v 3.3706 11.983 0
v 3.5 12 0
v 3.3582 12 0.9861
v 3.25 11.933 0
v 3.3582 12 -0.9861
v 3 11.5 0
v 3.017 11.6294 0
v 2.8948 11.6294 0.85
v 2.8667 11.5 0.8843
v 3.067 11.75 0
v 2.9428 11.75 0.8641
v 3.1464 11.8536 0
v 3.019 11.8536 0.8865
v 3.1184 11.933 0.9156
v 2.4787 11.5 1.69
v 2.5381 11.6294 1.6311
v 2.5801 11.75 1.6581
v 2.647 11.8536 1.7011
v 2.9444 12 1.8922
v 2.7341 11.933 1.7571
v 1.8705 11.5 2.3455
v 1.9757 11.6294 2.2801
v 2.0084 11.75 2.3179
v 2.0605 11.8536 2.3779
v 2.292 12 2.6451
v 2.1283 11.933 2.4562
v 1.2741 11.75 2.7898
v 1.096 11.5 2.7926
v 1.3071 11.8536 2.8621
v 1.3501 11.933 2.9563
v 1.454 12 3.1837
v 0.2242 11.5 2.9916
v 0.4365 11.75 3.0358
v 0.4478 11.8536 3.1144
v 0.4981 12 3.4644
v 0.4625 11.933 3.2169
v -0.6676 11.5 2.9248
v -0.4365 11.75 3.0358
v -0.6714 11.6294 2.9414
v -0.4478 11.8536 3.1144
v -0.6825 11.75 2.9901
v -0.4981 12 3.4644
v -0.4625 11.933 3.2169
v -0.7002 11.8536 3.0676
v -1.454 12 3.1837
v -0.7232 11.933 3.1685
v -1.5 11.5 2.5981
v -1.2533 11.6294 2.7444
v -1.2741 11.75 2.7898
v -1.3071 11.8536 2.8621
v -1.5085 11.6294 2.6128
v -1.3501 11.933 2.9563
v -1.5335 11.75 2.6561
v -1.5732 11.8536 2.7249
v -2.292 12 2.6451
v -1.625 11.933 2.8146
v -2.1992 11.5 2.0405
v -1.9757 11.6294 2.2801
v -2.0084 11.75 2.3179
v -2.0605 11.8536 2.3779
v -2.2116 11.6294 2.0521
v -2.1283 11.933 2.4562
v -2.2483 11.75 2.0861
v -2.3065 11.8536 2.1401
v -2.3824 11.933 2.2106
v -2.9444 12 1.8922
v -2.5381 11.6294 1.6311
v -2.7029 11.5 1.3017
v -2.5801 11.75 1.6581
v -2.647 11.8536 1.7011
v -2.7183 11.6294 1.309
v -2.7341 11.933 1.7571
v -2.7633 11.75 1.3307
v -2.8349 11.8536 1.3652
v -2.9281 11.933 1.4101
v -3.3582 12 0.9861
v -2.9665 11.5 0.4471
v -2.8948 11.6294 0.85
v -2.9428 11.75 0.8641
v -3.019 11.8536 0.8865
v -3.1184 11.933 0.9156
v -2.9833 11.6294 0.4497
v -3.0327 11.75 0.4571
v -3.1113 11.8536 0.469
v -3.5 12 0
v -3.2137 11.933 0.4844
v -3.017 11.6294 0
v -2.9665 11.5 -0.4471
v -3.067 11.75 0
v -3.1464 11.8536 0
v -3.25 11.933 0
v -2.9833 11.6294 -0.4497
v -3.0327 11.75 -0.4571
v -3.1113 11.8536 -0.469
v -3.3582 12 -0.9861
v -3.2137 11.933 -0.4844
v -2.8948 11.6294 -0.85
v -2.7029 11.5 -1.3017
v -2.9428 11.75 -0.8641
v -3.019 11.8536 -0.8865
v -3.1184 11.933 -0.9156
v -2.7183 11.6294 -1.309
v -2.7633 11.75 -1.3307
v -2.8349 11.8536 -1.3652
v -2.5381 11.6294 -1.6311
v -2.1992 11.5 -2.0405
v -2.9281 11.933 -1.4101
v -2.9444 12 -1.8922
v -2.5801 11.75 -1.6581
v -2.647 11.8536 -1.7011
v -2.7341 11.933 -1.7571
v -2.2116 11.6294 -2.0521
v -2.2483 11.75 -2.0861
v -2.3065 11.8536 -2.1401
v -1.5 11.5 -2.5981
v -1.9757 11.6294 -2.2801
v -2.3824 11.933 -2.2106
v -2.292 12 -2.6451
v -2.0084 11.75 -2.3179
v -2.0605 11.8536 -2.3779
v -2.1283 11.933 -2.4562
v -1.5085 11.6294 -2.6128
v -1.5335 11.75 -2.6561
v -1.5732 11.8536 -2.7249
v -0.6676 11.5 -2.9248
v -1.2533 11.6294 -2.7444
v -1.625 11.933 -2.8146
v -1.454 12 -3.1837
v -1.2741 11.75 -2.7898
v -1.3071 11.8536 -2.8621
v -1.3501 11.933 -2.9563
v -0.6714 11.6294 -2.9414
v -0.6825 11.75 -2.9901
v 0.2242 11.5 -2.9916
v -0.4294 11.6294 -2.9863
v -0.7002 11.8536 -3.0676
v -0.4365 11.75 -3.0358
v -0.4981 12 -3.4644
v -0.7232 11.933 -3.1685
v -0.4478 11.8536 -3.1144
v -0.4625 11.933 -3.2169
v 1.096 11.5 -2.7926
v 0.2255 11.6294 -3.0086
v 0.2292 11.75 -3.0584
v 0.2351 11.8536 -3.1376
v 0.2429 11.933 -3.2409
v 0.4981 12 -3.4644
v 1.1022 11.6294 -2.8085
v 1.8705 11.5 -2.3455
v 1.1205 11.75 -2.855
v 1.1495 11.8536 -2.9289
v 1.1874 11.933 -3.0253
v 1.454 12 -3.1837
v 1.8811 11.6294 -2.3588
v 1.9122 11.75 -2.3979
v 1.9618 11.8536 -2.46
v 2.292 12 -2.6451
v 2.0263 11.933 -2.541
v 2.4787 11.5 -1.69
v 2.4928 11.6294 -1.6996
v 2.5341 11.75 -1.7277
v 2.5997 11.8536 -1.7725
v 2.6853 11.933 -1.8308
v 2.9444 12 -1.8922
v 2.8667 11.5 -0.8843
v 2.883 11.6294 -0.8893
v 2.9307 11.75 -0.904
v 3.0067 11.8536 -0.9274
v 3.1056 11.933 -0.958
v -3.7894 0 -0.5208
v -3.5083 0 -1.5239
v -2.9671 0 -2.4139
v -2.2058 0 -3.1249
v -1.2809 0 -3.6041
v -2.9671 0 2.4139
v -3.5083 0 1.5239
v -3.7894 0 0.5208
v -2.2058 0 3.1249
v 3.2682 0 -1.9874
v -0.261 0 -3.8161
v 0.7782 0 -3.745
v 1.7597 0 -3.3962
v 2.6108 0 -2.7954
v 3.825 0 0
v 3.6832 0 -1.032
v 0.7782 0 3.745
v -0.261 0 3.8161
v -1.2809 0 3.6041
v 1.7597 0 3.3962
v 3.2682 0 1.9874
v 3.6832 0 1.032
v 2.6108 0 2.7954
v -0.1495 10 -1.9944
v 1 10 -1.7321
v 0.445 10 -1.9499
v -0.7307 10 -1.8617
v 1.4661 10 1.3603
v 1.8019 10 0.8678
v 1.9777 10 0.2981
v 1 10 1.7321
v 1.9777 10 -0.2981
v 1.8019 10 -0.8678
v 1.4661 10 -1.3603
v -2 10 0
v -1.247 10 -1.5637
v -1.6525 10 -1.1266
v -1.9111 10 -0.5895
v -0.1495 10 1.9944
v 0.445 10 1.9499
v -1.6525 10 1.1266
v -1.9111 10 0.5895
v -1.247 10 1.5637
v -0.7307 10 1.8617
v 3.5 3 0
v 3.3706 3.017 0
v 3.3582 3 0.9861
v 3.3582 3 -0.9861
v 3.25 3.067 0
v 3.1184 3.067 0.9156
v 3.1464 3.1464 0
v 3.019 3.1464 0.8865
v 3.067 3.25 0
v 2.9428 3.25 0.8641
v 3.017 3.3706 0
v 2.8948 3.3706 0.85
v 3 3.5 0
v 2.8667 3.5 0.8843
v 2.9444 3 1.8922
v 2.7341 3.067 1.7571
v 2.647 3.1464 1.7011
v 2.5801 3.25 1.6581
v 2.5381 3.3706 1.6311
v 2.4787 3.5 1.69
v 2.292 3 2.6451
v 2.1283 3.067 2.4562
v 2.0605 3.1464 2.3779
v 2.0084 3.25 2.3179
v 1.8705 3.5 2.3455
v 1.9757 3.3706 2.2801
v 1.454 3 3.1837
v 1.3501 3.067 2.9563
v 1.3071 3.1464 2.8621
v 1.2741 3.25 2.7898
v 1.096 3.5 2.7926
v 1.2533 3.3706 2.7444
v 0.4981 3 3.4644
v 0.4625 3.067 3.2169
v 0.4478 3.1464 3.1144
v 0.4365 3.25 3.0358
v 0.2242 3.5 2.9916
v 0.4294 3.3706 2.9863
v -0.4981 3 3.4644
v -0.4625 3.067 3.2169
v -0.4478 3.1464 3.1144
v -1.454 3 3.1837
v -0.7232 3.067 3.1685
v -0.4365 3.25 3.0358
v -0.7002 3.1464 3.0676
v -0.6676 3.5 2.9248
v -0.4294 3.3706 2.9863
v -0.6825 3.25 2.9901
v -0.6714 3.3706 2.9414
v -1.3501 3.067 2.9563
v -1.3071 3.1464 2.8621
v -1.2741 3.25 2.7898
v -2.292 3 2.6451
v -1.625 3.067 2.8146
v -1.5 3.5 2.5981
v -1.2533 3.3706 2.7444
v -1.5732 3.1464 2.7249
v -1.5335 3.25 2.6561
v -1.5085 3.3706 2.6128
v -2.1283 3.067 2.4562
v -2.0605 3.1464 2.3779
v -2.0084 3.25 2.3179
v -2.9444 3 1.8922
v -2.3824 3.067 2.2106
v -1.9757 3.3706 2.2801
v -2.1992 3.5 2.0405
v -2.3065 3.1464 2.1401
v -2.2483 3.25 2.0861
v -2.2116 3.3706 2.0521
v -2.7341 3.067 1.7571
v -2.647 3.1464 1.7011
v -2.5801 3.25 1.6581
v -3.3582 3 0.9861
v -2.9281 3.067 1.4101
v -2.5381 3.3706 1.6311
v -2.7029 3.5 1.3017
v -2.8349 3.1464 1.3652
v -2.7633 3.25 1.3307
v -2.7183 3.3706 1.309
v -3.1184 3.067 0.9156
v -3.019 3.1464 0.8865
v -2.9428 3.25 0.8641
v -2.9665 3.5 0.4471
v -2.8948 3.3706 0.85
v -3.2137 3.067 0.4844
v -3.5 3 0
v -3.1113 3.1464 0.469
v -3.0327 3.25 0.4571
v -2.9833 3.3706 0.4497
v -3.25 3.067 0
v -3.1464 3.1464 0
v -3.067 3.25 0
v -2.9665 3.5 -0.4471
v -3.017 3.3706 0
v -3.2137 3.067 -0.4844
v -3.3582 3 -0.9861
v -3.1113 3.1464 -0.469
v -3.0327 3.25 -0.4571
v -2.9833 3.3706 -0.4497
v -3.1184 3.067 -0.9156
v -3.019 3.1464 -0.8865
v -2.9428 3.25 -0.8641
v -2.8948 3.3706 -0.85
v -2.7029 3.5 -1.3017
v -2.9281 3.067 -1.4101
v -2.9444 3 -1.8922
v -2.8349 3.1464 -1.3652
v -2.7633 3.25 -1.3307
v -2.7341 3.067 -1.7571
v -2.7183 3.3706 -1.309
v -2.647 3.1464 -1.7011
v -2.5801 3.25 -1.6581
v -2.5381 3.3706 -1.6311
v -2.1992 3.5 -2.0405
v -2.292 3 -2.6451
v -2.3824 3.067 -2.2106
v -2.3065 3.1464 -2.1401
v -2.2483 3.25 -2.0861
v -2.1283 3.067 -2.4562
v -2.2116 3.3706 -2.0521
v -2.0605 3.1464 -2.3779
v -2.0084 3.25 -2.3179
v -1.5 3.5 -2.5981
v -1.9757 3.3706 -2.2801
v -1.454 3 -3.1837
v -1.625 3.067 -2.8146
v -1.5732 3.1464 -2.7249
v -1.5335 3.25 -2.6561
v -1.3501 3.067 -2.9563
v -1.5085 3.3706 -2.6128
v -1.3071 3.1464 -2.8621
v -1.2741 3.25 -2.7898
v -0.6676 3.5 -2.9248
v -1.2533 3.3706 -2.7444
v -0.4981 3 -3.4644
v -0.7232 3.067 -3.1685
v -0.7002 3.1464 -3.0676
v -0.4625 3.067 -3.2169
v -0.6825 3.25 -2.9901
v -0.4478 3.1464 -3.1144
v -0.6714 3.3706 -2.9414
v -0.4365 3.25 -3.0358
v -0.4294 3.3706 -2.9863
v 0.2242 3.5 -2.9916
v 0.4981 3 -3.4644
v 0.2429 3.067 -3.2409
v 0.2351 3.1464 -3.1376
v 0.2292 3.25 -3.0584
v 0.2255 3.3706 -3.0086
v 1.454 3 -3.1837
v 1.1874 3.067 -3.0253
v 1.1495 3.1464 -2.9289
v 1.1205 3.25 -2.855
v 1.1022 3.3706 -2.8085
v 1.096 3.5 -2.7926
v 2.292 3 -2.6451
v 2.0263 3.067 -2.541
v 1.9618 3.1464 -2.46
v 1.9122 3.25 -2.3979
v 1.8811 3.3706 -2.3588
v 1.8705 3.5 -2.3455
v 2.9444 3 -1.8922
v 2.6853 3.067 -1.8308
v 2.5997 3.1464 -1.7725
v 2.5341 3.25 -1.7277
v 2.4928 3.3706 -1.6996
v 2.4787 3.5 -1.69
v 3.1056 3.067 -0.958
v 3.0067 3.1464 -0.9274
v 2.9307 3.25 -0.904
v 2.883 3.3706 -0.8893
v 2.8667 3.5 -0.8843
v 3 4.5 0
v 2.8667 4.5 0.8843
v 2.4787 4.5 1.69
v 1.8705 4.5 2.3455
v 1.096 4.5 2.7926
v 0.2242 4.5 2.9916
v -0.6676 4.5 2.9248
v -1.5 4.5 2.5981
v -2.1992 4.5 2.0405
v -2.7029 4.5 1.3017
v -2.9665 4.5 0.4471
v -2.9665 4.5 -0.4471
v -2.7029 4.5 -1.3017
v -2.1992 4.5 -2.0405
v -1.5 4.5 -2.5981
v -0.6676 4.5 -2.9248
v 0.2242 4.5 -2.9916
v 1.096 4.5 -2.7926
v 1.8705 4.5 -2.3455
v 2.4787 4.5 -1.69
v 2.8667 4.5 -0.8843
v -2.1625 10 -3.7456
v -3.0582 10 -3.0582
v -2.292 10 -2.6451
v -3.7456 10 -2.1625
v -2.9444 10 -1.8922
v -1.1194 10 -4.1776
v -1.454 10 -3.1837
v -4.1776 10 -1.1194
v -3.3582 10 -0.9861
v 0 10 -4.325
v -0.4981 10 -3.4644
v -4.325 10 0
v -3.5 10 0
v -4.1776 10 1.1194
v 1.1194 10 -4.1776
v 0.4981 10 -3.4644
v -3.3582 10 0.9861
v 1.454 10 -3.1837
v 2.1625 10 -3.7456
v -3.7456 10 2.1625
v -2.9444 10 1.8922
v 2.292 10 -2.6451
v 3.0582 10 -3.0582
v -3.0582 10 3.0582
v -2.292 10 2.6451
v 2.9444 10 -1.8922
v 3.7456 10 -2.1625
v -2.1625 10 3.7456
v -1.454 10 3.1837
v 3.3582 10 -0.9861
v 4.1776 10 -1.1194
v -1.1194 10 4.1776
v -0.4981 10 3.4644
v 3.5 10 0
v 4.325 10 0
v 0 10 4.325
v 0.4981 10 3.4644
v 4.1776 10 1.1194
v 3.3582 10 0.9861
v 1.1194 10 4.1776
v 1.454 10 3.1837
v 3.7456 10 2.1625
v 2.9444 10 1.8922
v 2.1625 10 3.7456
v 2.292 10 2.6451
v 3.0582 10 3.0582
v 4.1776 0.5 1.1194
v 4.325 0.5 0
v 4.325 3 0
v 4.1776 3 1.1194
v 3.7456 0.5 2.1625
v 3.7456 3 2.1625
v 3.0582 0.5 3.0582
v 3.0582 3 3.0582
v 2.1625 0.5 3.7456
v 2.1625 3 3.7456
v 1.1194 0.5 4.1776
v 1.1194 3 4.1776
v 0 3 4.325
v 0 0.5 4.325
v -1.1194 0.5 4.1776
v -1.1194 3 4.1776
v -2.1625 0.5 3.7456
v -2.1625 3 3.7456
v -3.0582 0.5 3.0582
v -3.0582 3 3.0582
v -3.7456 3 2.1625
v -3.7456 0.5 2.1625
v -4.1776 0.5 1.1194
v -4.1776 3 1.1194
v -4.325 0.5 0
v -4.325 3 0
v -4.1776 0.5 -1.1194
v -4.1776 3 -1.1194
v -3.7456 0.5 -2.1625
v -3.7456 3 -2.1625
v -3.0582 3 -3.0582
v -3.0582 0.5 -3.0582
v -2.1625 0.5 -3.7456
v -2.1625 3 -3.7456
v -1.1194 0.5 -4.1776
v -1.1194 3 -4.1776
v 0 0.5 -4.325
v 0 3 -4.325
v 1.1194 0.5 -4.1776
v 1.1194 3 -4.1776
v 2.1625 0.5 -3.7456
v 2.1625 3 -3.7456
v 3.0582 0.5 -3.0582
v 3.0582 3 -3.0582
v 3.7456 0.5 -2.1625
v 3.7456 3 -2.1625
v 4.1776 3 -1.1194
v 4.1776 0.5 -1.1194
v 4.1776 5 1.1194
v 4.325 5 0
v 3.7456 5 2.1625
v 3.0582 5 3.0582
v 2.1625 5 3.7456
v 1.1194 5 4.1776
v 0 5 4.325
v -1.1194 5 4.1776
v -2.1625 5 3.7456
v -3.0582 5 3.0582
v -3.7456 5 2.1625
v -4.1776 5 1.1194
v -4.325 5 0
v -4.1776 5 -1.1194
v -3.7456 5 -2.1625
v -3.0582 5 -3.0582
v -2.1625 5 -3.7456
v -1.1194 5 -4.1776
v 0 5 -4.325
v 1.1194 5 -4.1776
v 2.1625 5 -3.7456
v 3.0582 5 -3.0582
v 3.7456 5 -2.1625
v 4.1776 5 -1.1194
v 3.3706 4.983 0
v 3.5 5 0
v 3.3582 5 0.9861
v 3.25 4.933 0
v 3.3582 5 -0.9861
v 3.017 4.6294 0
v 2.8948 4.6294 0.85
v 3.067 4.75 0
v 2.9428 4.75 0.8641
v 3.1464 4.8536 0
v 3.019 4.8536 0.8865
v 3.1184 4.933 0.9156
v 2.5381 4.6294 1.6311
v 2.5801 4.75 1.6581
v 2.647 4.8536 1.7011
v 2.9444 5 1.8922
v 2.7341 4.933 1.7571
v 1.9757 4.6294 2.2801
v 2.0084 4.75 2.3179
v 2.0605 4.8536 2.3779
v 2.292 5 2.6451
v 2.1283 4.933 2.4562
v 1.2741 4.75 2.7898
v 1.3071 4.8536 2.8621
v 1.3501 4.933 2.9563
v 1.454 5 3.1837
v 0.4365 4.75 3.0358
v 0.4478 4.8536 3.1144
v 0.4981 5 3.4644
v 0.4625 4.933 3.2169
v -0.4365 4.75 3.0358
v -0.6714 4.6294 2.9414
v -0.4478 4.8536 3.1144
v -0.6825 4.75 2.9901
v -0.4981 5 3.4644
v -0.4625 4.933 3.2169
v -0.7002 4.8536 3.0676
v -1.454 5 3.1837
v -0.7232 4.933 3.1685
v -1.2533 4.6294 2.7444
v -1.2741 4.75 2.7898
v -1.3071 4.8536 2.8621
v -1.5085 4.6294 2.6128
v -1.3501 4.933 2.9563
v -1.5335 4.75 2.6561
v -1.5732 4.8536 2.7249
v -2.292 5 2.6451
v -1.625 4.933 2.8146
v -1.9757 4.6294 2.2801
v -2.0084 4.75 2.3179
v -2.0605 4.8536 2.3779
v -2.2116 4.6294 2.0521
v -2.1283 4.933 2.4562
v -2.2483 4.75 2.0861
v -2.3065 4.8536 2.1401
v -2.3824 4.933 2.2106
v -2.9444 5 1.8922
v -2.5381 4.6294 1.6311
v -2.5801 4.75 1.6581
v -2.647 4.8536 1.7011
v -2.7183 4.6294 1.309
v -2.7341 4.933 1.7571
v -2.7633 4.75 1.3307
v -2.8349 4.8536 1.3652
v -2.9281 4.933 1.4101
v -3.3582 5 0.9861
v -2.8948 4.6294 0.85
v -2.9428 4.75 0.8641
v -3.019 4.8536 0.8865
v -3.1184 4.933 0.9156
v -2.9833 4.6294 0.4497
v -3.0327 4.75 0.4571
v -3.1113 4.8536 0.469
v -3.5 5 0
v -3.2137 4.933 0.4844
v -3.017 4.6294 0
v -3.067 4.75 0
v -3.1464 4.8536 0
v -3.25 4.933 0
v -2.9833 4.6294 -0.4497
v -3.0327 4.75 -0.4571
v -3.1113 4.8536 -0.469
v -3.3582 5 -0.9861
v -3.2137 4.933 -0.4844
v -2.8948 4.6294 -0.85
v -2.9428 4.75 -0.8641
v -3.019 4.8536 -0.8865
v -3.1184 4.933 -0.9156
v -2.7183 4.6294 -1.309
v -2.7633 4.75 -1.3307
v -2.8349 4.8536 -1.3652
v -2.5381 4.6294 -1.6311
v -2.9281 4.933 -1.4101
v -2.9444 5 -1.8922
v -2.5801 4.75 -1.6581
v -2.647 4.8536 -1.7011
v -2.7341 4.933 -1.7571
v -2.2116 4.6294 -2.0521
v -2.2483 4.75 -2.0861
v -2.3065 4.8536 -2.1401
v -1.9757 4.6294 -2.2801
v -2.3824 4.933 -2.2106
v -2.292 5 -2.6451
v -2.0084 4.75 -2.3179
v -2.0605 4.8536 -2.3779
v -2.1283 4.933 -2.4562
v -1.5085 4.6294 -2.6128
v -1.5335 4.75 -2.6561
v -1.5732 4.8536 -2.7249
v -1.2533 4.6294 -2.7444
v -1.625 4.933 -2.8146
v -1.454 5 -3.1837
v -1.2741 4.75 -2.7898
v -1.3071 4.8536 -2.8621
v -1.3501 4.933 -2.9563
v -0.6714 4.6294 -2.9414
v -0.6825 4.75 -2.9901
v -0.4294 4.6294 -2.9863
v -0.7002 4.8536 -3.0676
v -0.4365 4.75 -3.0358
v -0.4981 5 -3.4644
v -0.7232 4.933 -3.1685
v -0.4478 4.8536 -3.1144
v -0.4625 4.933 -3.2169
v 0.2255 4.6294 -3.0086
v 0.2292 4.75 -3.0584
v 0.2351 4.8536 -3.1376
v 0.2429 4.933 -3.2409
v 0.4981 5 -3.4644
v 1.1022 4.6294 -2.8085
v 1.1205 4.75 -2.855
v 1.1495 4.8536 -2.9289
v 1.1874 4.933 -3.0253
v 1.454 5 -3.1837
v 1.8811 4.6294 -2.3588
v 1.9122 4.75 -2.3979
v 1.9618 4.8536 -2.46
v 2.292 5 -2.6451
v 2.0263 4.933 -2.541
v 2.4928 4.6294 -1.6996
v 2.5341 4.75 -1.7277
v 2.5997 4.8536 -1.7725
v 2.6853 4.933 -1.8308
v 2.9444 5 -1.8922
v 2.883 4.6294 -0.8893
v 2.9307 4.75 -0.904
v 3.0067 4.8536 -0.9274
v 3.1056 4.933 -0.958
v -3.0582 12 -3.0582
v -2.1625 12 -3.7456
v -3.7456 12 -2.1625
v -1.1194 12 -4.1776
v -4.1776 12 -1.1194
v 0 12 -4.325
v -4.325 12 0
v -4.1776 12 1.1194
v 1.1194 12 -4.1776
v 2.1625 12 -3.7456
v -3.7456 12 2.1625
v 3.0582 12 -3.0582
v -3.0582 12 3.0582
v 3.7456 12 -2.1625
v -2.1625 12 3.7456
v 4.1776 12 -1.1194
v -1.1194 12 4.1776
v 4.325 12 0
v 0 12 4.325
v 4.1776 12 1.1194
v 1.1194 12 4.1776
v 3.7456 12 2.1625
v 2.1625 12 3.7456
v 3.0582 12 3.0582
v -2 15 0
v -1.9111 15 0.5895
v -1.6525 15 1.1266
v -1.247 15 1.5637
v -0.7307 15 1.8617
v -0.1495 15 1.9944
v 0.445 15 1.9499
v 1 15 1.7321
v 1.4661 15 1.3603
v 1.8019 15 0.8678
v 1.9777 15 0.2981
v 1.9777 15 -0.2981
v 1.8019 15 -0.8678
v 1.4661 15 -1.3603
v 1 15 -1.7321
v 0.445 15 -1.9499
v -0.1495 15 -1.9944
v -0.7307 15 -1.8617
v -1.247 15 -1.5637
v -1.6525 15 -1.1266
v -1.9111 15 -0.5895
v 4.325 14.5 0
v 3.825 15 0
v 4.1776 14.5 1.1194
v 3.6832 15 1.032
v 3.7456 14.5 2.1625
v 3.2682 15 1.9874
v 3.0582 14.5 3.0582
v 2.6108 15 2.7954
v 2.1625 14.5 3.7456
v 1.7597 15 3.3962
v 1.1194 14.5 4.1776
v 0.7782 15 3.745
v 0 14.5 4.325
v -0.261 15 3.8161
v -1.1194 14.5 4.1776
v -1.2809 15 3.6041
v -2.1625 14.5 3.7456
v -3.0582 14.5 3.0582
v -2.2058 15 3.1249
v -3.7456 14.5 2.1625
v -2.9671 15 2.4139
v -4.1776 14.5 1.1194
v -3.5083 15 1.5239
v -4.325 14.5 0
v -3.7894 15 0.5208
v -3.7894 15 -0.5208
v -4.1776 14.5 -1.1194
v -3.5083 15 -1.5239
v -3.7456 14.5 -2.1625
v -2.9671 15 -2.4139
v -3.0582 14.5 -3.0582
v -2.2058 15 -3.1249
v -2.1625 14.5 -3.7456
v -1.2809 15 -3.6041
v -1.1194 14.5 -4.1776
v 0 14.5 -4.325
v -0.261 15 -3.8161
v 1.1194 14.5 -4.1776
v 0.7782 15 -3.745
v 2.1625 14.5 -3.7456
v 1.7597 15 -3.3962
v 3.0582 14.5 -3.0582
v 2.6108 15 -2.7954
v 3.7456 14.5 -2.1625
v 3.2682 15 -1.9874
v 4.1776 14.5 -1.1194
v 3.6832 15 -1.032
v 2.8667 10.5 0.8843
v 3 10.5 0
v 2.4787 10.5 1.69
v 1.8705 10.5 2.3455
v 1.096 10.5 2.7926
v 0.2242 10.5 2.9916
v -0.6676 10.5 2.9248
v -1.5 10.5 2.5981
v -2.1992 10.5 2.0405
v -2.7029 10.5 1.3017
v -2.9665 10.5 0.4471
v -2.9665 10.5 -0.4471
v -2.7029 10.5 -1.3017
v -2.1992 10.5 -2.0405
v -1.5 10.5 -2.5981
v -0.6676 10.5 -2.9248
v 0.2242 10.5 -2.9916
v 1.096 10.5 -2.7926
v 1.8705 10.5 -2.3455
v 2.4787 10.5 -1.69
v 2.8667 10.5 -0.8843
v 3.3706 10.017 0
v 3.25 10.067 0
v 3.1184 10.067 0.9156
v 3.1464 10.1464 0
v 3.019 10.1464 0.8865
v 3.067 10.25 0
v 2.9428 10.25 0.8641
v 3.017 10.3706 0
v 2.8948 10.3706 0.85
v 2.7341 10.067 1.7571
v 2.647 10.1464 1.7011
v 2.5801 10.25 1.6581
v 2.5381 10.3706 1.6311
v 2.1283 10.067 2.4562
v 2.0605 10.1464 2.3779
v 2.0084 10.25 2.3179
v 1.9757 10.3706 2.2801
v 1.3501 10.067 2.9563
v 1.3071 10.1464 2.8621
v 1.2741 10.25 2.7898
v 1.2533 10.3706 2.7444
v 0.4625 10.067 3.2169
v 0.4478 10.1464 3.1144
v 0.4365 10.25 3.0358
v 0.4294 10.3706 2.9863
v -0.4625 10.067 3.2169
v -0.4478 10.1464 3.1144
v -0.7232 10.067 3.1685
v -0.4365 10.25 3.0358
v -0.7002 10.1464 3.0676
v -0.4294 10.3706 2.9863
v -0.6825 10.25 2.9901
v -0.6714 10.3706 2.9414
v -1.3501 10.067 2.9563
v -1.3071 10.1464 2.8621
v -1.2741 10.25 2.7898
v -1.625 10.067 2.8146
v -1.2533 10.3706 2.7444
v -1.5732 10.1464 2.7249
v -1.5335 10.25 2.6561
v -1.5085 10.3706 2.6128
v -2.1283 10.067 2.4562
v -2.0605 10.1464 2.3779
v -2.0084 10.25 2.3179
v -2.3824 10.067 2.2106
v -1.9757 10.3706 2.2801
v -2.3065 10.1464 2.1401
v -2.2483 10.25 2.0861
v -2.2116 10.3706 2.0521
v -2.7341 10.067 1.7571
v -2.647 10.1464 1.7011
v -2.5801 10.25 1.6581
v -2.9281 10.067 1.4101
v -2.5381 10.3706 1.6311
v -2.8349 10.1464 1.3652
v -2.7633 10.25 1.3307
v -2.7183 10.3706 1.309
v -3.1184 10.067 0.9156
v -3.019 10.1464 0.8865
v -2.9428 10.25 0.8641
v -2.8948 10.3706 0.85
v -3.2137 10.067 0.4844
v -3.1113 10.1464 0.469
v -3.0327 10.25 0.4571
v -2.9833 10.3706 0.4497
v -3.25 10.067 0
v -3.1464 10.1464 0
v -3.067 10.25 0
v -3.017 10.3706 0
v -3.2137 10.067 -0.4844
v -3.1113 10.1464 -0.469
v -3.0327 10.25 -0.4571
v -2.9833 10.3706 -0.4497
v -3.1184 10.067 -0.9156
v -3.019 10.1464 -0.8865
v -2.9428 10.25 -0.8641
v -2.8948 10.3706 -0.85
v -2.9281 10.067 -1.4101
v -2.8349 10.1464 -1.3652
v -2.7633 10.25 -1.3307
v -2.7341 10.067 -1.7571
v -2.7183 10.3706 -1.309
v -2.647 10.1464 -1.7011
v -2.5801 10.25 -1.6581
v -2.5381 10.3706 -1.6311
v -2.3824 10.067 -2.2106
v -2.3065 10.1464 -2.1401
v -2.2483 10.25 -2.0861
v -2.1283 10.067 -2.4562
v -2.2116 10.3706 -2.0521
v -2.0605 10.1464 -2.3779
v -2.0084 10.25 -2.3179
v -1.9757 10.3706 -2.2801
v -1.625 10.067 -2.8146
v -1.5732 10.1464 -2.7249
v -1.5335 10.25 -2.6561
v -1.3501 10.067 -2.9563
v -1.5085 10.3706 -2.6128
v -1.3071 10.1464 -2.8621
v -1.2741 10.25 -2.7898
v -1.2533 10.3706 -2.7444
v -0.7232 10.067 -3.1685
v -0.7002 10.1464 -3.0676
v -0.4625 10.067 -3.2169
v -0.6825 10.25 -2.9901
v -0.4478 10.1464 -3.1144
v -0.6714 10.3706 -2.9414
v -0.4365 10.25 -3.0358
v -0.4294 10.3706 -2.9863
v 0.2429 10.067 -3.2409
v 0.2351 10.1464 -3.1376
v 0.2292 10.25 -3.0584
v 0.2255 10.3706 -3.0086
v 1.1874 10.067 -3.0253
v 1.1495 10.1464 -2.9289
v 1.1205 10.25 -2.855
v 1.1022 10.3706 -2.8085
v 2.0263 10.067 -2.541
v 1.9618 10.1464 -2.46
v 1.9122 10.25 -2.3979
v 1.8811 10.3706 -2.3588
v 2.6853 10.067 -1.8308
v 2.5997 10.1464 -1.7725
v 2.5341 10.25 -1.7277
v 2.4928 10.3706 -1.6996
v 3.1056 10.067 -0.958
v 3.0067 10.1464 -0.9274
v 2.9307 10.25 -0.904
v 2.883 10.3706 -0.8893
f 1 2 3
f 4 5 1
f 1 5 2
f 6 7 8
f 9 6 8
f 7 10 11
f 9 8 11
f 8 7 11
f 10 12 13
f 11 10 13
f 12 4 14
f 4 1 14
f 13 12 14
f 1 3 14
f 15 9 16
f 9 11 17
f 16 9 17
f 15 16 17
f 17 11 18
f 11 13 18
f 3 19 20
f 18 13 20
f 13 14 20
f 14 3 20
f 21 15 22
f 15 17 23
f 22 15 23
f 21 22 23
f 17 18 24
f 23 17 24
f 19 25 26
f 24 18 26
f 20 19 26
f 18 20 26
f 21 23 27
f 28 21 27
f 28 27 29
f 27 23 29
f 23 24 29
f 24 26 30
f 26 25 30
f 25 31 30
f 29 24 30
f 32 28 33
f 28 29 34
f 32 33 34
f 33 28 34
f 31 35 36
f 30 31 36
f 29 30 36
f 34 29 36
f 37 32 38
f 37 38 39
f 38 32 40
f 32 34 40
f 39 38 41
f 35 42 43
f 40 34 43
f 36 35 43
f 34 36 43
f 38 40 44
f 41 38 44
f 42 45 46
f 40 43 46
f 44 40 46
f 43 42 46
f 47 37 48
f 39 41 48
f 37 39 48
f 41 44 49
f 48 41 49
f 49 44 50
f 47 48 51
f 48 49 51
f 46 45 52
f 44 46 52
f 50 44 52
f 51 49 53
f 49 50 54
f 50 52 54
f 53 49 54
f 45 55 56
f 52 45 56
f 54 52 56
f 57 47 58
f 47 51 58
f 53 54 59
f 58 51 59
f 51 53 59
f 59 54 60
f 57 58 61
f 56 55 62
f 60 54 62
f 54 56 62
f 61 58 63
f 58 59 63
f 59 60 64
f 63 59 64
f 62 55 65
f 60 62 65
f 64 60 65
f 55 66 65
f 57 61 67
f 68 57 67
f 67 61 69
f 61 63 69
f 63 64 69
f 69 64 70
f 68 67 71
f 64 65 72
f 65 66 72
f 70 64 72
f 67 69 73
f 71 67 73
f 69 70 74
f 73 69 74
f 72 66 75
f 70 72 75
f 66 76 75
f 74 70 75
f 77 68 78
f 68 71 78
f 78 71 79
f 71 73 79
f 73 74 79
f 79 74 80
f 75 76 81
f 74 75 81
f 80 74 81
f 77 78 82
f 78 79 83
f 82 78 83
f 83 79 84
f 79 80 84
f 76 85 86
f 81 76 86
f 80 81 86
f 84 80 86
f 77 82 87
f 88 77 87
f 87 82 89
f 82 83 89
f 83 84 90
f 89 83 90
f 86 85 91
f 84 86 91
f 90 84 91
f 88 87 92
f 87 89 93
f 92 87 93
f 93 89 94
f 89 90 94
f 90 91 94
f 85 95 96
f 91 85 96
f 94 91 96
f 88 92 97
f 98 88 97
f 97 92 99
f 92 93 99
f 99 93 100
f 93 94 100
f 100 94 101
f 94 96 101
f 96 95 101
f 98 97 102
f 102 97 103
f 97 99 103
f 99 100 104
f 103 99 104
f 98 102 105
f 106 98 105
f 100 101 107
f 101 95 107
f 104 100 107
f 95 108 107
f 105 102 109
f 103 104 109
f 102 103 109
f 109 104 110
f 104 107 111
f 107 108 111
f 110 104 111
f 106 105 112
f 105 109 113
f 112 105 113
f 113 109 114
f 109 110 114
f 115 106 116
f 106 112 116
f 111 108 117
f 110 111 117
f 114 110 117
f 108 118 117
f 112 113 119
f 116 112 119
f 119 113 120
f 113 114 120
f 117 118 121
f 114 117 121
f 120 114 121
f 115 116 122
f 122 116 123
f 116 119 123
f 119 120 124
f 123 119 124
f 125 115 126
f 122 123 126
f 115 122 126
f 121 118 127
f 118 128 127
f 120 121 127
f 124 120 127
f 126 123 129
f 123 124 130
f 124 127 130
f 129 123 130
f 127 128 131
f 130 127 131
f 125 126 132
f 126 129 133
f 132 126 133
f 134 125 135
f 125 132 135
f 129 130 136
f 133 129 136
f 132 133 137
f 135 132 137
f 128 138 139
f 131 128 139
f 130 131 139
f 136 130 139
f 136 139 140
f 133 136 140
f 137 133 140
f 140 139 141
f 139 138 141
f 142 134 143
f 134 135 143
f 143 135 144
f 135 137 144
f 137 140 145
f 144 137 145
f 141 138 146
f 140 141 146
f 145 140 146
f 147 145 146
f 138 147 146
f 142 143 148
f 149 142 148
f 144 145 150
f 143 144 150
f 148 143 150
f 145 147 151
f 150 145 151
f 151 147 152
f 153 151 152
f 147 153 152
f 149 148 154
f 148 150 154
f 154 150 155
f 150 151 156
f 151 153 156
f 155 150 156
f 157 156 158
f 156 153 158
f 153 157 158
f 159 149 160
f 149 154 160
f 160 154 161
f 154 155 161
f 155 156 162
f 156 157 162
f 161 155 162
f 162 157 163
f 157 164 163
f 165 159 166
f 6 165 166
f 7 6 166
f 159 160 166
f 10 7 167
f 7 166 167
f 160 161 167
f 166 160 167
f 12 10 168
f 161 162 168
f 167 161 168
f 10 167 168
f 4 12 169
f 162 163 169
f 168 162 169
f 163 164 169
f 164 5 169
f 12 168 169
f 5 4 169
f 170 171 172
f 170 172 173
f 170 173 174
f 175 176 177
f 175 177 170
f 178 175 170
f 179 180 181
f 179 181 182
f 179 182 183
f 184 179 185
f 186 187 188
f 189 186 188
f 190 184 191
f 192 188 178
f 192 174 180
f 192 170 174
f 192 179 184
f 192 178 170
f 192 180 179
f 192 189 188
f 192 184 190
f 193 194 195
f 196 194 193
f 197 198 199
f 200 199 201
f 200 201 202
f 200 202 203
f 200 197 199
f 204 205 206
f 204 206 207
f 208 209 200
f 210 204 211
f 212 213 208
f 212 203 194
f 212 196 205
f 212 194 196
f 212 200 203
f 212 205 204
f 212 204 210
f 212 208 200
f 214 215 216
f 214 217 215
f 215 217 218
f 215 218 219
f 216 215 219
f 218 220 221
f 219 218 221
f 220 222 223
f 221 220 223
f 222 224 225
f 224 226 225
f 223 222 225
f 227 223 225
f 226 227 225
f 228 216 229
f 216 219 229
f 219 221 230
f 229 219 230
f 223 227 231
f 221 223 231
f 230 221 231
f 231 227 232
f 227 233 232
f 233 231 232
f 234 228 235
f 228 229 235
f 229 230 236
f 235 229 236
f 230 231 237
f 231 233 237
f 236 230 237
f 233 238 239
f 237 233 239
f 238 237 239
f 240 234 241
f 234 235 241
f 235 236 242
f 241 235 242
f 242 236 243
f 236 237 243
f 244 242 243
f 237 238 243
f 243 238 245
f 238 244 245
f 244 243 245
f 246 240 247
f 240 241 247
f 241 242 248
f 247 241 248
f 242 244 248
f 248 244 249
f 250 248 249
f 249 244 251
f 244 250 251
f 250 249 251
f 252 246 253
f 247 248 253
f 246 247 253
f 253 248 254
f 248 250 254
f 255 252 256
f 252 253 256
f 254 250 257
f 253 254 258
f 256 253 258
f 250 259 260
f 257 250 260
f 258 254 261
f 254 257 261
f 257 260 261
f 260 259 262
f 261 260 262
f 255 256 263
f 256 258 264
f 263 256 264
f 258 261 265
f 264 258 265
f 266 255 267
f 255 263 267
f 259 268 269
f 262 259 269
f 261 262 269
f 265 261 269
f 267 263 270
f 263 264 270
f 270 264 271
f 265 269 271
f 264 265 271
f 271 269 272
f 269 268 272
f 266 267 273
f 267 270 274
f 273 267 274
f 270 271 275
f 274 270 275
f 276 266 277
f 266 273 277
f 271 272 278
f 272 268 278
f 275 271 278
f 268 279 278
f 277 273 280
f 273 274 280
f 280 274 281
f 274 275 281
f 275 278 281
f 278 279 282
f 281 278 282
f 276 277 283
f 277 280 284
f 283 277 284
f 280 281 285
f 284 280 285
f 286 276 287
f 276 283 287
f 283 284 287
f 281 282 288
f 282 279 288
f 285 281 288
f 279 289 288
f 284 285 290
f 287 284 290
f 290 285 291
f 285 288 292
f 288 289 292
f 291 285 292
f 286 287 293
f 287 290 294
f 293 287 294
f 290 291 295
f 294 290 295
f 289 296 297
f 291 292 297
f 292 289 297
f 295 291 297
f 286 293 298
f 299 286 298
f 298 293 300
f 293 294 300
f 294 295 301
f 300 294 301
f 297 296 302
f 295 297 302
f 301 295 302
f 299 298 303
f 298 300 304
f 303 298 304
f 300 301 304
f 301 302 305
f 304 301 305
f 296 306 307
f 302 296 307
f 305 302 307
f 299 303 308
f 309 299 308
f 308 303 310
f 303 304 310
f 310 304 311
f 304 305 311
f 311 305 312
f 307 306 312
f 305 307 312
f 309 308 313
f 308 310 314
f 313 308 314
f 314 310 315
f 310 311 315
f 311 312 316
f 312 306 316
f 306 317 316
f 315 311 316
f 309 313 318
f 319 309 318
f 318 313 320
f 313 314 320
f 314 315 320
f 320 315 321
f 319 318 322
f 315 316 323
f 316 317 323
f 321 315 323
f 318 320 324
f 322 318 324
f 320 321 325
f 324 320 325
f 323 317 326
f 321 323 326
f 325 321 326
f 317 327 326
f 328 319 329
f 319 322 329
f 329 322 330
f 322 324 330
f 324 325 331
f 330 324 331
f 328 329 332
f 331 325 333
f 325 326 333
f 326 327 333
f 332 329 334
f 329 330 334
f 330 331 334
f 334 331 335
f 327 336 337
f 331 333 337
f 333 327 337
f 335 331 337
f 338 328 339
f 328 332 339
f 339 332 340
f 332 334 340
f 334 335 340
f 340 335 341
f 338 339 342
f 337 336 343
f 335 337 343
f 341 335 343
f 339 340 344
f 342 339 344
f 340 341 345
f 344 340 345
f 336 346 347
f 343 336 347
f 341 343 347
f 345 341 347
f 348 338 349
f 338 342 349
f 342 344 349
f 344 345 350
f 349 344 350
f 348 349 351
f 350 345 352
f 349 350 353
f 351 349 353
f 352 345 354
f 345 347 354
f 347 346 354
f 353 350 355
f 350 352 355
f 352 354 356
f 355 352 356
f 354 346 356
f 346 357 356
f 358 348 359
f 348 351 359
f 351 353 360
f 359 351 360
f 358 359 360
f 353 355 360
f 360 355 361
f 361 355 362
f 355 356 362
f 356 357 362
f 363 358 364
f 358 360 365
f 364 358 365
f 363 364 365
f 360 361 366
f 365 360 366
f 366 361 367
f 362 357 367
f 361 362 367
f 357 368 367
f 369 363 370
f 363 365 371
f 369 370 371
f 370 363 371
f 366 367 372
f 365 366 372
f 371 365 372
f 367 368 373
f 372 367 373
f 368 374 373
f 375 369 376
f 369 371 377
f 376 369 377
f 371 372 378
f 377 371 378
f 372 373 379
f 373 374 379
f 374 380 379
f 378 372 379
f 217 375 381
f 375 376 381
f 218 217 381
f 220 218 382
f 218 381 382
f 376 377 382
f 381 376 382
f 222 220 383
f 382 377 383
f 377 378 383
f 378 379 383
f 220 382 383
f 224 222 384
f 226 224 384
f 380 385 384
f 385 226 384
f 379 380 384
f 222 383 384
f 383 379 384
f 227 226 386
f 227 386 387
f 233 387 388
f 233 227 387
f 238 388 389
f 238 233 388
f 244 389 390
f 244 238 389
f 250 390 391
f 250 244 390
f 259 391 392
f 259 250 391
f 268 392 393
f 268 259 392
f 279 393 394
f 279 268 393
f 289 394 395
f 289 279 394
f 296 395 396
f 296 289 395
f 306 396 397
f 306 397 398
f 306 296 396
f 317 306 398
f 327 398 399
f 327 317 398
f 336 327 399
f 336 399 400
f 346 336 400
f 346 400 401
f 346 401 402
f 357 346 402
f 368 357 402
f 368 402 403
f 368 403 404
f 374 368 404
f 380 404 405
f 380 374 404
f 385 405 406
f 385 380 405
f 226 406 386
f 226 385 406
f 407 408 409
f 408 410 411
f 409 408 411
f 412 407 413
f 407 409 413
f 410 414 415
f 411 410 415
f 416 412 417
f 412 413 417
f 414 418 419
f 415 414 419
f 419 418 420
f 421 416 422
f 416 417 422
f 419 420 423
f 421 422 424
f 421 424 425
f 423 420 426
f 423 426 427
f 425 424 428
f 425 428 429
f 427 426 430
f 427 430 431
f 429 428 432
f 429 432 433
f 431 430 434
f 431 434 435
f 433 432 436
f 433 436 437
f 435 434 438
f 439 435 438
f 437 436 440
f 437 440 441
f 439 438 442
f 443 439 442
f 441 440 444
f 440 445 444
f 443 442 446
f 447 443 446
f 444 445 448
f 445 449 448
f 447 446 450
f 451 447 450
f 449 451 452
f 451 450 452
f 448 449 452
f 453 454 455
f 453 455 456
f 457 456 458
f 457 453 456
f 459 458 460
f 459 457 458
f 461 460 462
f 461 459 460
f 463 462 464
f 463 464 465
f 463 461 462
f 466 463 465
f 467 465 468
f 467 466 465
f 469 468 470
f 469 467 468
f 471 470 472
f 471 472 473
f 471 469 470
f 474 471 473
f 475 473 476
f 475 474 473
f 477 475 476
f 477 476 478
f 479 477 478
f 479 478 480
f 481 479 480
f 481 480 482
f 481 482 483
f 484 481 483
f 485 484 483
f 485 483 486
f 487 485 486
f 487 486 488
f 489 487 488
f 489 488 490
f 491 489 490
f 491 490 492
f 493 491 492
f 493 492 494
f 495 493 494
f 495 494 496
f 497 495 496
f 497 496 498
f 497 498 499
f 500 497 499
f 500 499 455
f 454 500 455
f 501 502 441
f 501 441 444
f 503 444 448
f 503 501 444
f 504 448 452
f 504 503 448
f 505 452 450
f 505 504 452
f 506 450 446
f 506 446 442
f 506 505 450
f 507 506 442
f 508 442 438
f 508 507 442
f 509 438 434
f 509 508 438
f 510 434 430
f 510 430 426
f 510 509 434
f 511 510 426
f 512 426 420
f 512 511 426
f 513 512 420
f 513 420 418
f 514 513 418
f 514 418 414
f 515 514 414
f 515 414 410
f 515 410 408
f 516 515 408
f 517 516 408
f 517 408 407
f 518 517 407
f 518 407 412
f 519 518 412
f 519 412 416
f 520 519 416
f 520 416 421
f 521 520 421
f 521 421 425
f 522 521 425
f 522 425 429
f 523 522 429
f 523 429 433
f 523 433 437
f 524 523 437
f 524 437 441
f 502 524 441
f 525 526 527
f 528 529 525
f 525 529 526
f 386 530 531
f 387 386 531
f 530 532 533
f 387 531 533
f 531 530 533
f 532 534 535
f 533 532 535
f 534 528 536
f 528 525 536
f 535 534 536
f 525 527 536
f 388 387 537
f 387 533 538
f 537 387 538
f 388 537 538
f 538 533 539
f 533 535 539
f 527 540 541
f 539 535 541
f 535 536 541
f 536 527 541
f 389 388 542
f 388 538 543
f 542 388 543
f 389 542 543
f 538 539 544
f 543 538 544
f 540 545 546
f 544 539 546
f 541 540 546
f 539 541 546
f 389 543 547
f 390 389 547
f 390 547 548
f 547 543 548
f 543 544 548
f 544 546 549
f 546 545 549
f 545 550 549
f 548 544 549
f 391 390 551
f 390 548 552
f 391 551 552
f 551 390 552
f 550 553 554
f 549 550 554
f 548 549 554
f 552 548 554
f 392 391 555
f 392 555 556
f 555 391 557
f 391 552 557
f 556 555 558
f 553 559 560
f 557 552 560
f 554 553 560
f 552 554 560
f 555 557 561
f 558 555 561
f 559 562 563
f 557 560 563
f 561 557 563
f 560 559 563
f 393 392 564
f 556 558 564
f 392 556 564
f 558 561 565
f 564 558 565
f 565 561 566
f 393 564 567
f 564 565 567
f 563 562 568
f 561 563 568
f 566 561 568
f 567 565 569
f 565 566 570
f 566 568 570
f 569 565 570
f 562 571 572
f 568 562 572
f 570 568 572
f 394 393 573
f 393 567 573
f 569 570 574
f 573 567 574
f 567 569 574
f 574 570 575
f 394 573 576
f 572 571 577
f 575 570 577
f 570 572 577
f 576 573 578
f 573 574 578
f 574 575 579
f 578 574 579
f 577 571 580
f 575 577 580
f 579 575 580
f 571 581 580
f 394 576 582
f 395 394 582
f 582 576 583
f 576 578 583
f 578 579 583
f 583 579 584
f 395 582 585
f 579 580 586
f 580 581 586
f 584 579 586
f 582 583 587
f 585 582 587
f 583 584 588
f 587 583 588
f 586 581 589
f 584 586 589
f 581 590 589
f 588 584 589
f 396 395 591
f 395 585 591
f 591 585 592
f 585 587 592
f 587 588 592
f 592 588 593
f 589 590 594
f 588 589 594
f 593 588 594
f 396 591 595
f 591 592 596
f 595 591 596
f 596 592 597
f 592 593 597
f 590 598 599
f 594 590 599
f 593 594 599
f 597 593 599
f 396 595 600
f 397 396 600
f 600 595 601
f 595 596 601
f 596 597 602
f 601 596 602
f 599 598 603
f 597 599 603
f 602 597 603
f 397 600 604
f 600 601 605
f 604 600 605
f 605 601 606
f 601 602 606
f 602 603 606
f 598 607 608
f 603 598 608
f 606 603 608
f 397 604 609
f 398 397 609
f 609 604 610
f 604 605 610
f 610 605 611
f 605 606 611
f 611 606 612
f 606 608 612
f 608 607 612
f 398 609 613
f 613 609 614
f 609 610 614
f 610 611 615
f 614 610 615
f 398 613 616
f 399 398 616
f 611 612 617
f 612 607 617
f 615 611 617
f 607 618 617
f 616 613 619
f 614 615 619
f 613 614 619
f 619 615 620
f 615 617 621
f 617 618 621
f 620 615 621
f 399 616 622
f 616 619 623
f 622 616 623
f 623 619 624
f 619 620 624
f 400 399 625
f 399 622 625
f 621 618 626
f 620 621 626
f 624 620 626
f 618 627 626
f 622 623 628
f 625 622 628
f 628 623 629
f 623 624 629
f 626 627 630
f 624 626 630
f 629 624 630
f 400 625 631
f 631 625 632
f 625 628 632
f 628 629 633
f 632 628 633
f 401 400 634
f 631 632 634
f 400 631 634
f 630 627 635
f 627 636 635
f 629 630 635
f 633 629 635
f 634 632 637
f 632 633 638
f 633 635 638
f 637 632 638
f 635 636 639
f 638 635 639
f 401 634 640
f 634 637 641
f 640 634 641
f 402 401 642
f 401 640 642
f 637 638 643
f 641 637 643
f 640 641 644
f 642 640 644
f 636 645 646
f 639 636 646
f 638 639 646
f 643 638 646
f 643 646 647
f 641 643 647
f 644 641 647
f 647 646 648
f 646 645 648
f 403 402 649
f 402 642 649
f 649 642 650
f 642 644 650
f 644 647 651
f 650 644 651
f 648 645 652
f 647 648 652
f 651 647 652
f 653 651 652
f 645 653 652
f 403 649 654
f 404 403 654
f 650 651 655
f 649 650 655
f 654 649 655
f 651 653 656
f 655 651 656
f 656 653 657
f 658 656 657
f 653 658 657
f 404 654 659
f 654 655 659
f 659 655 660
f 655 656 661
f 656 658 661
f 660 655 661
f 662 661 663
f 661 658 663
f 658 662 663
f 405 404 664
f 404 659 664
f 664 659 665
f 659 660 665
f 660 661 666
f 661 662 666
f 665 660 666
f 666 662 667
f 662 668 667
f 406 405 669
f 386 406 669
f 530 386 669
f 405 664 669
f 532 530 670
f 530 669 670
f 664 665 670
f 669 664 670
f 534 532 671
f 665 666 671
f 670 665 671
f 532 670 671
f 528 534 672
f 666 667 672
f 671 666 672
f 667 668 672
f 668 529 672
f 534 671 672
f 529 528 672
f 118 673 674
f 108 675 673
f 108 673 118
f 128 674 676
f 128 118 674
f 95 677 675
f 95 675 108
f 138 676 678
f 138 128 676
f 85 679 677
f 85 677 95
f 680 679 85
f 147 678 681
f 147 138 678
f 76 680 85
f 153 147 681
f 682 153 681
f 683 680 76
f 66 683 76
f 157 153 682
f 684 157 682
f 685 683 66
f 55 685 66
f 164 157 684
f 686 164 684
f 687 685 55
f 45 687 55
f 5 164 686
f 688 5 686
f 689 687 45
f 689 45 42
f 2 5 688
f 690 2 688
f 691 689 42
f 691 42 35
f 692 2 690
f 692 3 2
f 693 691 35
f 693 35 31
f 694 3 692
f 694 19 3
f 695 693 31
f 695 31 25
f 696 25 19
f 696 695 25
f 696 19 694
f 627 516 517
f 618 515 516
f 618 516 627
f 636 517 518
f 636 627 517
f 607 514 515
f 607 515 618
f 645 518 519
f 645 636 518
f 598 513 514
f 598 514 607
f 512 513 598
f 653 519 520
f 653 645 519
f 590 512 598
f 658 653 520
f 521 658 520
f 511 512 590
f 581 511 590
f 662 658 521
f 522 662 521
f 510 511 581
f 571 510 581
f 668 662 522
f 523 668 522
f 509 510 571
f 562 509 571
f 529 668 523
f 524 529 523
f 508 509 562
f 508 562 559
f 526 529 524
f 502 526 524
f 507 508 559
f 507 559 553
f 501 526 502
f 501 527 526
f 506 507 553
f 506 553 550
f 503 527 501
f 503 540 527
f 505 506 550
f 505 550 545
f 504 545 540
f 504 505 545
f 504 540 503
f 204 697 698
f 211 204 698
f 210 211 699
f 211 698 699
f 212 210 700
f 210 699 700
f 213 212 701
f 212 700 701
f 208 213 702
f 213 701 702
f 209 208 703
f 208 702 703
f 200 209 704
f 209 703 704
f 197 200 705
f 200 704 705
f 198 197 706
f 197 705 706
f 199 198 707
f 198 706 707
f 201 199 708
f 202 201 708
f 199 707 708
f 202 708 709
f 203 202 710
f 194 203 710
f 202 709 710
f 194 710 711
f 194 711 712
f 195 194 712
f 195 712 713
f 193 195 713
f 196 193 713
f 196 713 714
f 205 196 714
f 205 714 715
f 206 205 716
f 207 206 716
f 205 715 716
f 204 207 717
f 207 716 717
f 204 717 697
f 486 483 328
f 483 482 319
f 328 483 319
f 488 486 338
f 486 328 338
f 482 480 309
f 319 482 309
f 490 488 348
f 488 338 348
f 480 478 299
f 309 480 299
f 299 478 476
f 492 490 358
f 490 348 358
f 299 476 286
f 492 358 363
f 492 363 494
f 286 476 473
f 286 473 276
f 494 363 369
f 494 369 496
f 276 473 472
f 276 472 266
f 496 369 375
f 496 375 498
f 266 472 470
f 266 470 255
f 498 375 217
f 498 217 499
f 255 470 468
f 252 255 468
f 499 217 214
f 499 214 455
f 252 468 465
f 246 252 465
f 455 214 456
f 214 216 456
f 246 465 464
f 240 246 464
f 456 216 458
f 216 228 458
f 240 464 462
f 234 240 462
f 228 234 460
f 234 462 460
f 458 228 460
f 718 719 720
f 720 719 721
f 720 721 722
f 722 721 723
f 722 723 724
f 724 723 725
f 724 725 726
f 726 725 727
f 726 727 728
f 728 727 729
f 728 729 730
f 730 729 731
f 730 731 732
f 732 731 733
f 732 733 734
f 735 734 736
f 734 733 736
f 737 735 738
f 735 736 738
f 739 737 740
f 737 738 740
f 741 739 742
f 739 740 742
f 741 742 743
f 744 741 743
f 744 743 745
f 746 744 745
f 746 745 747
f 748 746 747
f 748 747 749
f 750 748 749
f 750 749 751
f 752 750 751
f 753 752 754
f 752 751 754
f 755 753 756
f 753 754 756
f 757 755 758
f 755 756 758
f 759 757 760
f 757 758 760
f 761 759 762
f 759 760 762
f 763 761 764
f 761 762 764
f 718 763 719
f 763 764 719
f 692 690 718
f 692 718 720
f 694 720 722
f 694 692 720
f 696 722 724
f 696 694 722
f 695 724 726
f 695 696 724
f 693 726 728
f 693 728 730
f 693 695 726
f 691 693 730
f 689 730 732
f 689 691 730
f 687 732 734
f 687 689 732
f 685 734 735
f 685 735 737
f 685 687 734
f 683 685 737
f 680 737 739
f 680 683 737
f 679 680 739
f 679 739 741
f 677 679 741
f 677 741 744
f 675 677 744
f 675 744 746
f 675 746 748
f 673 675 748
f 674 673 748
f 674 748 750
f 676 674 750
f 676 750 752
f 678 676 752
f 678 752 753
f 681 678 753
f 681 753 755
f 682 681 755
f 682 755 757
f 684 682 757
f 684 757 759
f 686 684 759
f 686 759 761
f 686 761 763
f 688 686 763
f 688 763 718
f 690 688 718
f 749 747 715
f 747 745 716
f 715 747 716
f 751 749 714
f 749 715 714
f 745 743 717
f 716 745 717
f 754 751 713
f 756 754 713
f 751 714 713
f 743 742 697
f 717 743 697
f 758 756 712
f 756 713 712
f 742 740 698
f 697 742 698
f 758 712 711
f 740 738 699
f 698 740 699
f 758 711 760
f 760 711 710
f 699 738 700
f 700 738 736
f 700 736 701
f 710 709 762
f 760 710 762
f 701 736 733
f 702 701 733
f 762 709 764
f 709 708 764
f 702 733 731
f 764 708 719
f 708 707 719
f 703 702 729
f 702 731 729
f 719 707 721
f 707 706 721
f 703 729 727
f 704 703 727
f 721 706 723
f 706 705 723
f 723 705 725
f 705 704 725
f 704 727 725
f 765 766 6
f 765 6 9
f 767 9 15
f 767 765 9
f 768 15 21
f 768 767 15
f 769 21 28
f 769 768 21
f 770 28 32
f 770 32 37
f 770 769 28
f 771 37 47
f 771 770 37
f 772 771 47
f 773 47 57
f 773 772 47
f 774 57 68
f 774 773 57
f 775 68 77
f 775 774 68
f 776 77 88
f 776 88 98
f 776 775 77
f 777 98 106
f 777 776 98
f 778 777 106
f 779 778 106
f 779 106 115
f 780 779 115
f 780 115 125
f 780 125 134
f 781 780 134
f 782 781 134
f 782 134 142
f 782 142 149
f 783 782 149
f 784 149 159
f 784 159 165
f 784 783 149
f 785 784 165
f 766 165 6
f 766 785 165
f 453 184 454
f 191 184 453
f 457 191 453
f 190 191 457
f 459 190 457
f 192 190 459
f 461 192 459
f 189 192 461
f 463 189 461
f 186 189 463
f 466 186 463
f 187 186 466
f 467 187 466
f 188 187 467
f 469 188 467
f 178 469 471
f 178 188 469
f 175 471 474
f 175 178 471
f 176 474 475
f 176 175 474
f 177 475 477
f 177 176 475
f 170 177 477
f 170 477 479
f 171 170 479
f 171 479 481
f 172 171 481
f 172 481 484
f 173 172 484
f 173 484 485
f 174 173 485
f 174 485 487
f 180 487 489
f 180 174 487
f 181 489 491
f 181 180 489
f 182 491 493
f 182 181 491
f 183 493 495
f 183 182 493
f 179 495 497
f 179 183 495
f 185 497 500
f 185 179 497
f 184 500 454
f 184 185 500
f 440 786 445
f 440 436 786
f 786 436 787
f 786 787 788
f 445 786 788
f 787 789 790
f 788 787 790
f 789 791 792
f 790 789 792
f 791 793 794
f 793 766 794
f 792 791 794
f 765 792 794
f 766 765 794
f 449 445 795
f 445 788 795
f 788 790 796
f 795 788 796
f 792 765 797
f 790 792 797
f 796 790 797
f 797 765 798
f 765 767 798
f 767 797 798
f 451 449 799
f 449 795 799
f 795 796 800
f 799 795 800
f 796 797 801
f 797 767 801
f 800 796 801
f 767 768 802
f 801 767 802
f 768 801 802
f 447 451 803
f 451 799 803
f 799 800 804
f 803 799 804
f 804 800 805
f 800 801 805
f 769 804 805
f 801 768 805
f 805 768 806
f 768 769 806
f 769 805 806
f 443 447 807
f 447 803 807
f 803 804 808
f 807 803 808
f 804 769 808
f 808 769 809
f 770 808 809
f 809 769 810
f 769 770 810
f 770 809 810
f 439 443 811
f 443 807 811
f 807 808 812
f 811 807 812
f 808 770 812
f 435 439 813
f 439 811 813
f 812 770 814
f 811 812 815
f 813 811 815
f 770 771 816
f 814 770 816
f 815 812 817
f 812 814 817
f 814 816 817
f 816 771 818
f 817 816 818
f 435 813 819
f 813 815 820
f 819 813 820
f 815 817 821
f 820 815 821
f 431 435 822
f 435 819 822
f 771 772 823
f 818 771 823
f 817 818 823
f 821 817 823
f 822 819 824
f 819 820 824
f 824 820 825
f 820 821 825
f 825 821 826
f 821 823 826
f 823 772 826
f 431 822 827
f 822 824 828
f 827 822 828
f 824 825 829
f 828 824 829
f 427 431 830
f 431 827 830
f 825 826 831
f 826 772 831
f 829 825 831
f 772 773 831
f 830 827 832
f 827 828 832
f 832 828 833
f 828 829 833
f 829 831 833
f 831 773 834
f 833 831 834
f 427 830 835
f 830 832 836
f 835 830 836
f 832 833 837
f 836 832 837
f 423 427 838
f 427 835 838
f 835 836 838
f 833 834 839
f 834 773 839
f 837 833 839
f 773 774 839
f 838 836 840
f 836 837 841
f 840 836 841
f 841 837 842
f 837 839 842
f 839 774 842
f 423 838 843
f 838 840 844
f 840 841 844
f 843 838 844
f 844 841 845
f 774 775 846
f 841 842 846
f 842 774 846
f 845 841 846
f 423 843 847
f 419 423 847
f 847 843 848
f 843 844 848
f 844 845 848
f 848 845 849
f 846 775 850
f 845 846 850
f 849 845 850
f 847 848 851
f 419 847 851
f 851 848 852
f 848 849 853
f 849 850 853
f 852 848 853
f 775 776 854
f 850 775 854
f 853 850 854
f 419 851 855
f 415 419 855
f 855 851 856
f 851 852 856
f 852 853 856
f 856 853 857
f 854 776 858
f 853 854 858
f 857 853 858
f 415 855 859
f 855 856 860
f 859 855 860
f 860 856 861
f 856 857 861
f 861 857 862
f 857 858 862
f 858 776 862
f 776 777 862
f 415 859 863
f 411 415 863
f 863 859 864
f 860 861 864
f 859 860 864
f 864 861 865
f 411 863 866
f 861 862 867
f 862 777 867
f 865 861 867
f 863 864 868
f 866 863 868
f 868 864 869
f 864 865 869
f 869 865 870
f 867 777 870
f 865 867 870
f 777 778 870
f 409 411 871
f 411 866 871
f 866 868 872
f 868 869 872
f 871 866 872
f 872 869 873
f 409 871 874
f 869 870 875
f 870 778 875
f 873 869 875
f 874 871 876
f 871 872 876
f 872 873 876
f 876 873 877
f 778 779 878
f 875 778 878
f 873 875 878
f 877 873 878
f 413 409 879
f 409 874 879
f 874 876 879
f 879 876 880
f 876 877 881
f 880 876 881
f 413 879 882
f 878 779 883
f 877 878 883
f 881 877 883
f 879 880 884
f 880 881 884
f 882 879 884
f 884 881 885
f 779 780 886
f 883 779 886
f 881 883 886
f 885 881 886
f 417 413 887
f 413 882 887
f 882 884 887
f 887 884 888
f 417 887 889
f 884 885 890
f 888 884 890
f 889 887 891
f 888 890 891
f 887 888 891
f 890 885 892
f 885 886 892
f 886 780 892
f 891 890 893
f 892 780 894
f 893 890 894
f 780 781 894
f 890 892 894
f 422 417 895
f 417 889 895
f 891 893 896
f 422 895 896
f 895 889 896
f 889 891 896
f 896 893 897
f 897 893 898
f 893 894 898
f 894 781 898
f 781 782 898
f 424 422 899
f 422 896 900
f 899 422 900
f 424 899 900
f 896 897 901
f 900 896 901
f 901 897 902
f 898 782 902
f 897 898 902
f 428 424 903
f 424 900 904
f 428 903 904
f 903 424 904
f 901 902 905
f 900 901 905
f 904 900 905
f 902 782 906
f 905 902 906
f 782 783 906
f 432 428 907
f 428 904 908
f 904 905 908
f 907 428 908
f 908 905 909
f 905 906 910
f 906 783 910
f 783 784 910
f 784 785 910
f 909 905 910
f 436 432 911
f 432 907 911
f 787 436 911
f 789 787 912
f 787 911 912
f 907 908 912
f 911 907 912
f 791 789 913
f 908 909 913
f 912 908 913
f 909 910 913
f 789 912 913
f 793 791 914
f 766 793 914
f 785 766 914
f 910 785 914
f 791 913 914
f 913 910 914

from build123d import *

# Parameters (mm, degrees)
F0_R      = 4.325
F1_DEPTH  = 15
F4_R      = 4.5
F4_R_2    = 3
F5_DEPTH  = 2
F6_R      = 4.5
F6_R_2    = 3
F7_DEPTH  = 2
F8_SIZE   = 0.5
F9_R      = 0.5
F10_R     = 2
F11_DEPTH = 5


with BuildPart() as f1:
    # F0 (on Front) → F1 (new body)
    with BuildSketch(Plane.XZ):
        Circle(F0_R)
    extrude(amount=-F1_DEPTH)

    # F4 (on offset) → F5 (cut)
    with BuildSketch(Plane.XZ.offset(-3)):
        Circle(F4_R)
        Circle(F4_R_2, mode=Mode.SUBTRACT)
    extrude(amount=-F5_DEPTH, mode=Mode.SUBTRACT)

    # F6 (on offset) → F7 (cut)
    with BuildSketch(Plane.XZ.offset(-10)):
        Circle(F6_R)
        Circle(F6_R_2, mode=Mode.SUBTRACT)
    extrude(amount=-F7_DEPTH, mode=Mode.SUBTRACT)

    # F8
    f8_edges = [f1.edges().sort_by_distance(p)[0] for p in [
        (-4.325, 0, 0),
        (-4.325, 15, 0),
    ]]
    chamfer(f8_edges, length=F8_SIZE)

    # F9
    f9_edges = [f1.edges().sort_by_distance(p)[0] for p in [
        (-3, 5, 0),
        (-3, 12, 0),
        (-3, 10, 0),
        (-3, 3, 0),
    ]]
    fillet(f9_edges, radius=F9_R)

    # F10 (on face) → F11 (cut)
    with BuildSketch(Plane(origin=(0, 15, 0), x_dir=(-1, 0, 0), z_dir=(0, 1, 0))):
        Circle(F10_R)
    extrude(amount=-F11_DEPTH, mode=Mode.SUBTRACT)


solid = f1.part
